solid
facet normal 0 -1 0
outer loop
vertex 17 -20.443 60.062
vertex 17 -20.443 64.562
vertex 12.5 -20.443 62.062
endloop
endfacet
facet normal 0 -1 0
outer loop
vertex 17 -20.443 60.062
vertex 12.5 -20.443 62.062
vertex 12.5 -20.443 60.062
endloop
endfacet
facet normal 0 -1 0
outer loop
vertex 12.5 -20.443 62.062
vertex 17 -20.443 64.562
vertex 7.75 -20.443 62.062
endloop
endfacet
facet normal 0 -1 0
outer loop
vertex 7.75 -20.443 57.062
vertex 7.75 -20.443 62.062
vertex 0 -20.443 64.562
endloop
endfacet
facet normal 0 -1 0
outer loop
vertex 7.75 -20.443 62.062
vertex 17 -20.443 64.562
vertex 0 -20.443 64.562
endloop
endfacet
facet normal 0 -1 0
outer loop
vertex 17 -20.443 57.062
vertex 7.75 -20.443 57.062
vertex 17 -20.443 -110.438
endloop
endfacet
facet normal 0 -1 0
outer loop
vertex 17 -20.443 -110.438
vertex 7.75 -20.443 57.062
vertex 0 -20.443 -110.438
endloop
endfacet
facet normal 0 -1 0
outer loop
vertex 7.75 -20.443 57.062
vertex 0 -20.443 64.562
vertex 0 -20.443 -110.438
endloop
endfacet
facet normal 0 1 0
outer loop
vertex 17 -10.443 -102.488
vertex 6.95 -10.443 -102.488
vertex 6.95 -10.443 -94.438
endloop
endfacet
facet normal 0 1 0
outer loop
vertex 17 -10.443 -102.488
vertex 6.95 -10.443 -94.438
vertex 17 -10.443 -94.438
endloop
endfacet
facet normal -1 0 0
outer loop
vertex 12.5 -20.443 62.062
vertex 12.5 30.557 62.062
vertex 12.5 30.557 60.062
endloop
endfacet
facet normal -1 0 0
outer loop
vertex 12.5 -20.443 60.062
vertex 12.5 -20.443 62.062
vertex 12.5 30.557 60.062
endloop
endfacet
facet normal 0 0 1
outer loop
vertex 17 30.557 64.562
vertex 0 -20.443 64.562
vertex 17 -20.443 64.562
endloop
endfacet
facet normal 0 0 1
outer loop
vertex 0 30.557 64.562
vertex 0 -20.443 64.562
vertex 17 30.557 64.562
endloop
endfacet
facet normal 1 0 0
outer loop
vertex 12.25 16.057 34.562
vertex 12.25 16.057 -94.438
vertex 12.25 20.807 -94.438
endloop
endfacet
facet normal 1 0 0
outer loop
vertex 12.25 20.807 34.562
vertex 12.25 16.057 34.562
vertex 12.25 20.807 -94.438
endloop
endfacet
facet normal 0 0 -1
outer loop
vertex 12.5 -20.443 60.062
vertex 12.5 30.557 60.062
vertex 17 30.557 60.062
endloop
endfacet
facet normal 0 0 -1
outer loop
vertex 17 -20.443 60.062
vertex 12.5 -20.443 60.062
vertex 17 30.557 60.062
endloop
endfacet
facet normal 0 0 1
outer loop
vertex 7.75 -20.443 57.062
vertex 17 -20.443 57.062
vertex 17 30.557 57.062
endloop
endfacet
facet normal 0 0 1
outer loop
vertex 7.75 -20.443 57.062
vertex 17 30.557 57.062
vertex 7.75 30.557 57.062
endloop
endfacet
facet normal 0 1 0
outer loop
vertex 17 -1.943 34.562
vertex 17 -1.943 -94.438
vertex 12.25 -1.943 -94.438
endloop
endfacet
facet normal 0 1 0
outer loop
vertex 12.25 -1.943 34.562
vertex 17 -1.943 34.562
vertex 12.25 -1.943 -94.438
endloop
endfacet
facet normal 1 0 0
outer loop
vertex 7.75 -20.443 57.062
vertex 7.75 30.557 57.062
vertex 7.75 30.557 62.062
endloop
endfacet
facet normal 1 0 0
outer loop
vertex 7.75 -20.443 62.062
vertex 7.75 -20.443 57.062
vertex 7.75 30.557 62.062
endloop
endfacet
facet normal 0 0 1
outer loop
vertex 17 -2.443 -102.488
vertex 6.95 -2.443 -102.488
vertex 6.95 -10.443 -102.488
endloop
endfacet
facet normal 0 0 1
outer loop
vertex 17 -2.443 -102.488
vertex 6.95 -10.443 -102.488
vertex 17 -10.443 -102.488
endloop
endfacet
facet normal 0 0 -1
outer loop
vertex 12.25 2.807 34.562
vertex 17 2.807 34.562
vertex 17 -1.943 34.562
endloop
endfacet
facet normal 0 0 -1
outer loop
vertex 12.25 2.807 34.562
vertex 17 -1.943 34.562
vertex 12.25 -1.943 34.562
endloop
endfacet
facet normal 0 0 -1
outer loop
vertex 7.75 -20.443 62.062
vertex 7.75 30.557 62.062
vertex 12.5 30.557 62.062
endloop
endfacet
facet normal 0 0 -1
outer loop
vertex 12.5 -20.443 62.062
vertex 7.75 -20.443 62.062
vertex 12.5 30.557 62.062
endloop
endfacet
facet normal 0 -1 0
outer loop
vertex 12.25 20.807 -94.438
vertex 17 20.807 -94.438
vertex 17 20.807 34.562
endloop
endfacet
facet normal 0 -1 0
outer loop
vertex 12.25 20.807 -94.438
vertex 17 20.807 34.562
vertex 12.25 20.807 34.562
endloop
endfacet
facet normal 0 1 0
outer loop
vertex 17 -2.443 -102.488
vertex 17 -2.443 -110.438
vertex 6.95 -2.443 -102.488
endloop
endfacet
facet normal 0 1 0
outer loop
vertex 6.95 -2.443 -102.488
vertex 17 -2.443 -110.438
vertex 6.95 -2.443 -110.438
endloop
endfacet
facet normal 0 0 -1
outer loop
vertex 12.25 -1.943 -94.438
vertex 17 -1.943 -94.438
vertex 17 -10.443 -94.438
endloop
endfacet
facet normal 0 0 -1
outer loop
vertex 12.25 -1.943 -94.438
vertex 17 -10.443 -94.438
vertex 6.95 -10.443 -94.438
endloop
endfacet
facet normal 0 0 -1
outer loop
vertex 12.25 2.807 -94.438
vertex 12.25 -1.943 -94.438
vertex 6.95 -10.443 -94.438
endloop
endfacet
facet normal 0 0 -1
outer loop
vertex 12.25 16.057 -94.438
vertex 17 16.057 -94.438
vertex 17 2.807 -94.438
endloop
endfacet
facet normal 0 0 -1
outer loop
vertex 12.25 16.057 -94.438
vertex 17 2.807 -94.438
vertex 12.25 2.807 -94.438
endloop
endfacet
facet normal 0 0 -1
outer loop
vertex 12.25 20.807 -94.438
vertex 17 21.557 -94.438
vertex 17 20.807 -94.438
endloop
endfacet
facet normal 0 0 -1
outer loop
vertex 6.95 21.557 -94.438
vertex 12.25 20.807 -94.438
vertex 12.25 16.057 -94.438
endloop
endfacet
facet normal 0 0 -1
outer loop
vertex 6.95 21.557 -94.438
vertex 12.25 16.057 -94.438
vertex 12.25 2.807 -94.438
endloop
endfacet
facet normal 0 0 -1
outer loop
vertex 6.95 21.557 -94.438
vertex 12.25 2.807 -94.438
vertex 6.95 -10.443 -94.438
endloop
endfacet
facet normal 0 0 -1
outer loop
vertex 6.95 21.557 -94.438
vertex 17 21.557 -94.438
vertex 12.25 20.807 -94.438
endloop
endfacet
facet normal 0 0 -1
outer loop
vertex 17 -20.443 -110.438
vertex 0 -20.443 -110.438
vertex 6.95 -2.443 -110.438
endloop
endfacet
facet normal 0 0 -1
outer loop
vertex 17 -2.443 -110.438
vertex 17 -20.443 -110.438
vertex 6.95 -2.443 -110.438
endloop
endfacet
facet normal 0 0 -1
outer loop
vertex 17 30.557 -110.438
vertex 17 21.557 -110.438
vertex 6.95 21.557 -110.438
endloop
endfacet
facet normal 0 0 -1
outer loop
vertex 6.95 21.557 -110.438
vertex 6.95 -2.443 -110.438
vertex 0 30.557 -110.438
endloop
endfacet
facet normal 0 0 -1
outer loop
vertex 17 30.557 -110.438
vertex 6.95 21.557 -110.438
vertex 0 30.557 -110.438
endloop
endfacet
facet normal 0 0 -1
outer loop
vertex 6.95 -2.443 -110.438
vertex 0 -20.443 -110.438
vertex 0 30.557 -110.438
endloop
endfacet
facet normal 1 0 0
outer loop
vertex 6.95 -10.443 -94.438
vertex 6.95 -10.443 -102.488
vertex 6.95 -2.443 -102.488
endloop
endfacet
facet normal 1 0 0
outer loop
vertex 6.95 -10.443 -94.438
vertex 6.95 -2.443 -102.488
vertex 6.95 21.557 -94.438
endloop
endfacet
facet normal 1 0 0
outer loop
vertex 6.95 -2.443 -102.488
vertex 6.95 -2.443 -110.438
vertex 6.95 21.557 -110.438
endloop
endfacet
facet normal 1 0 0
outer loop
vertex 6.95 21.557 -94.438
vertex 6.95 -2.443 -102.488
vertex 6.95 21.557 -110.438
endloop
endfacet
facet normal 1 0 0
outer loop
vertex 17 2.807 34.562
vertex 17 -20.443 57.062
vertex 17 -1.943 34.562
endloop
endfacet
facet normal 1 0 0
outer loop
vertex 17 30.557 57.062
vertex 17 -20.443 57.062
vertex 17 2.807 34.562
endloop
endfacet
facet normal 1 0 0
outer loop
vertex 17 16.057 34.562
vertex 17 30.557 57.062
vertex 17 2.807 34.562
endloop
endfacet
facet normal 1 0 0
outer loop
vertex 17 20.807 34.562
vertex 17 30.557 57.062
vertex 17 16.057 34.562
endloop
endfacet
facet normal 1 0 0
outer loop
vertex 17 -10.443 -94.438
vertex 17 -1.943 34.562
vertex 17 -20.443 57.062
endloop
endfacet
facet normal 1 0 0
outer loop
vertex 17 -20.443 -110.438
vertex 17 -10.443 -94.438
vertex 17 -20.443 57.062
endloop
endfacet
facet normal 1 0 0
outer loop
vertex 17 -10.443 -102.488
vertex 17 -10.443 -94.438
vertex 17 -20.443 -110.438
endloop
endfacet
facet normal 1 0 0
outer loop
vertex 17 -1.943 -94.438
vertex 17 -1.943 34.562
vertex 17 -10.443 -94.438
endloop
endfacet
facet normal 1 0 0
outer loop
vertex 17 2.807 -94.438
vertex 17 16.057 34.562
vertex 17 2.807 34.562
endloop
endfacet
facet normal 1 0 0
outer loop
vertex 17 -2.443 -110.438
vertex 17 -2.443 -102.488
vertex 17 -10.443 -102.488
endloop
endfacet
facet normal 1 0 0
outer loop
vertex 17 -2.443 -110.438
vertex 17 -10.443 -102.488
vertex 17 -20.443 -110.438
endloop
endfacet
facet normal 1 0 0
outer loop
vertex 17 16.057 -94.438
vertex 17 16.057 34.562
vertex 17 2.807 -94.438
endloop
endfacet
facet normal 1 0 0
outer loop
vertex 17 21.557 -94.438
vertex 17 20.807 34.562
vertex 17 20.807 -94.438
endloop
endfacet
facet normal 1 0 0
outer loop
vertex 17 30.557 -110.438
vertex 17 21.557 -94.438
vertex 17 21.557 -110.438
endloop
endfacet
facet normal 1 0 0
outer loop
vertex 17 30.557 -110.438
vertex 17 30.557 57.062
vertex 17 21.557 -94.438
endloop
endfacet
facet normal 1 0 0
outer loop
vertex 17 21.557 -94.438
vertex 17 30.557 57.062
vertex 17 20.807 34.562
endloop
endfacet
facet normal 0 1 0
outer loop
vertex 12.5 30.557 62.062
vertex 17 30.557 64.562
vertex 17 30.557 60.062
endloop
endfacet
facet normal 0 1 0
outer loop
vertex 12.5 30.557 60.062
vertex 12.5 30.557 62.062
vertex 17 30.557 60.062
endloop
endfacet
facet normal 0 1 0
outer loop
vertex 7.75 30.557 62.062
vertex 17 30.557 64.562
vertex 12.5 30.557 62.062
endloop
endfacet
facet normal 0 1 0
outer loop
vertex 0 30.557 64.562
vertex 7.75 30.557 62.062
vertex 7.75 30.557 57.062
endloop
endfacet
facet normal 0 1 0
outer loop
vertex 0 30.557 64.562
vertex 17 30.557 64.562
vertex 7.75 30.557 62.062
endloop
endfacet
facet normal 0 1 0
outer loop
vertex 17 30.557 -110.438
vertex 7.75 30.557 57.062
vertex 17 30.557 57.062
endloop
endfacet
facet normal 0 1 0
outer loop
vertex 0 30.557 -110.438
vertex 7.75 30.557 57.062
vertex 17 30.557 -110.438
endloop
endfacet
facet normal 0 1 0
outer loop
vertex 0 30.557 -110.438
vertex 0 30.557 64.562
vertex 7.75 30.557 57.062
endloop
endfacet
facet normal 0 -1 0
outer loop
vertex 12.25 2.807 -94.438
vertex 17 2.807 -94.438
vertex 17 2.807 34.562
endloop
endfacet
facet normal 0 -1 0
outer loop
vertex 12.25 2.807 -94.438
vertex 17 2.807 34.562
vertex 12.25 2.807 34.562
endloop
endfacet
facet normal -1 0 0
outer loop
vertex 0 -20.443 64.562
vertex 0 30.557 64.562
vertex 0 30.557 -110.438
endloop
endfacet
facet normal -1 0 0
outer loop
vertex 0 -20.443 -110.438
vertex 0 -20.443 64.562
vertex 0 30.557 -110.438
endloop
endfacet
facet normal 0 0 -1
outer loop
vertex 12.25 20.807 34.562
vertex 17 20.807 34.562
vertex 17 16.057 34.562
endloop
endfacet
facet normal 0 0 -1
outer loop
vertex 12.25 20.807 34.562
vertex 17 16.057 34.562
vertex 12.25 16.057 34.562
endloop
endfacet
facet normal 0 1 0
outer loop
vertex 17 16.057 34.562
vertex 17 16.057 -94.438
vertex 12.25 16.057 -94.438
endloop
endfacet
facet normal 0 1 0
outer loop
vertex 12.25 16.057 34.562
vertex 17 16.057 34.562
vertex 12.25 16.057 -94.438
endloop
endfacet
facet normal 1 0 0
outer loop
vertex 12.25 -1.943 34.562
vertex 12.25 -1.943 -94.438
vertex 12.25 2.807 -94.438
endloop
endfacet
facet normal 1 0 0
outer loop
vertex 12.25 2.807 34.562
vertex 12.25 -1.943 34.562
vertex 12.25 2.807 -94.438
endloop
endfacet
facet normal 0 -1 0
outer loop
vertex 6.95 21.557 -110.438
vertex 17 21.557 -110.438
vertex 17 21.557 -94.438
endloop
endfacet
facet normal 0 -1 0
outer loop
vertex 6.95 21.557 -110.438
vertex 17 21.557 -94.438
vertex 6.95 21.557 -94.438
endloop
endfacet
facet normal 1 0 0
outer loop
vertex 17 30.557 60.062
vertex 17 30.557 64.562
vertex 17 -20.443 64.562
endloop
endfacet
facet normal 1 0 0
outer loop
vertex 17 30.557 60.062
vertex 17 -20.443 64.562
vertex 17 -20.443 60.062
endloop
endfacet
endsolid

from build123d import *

# Parameters (mm, degrees)
SKETCH1_W           = 175
SKETCH1_H           = 51
BOSS_EXTRUDE1_DEPTH = 17
CUT_EXTRUDE3_DEPTH  = 52
SKETCH7_W           = 4.75
SKETCH7_H           = 4.75
CUT_EXTRUDE5_DEPTH  = 145
SKETCH10_W          = 10.05
SKETCH10_H          = 24
CUT_EXTRUDE6_DEPTH  = 16
SKETCH11_W          = 10.05
SKETCH11_H          = 8.05
CUT_EXTRUDE7_DEPTH  = 8


with BuildPart() as part:
    # Sketch1 → Boss-Extrude1 (new body)
    with BuildSketch(Plane(origin=(0, 0, 0), x_dir=(0, 0, -1), z_dir=(1, 0, 0))):
        with Locations((22.937921078, 5.057266603)):
            Rectangle(SKETCH1_W, SKETCH1_H)
    extrude(amount=BOSS_EXTRUDE1_DEPTH)

    # Sketch6 → Cut-Extrude3 (cut, through all)
    with BuildSketch(Plane(origin=(0, 30.557266603, 0), x_dir=(1, 0, 0), z_dir=(0, 1, 0))):
        Polygon((12.5, -60.062078922), (17, -60.062078922), (17, -57.062078922), (14.5, -57.062078922), (7.75, -57.062078922), (7.75, -62.062078922), (12.5, -62.062078922), align=None)
    extrude(amount=-CUT_EXTRUDE3_DEPTH, mode=Mode.SUBTRACT)

    # Sketch7 → Cut-Extrude5 (cut)
    with BuildSketch(Plane(origin=(0, 0, -110.437921078), x_dir=(-1, 0, 0), z_dir=(0, 0, -1))):
        with Locations((-14.625, 0.432266603)):
            Rectangle(SKETCH7_W, SKETCH7_H)
        with Locations((-14.625, 18.432266603)):
            Rectangle(SKETCH7_W, SKETCH7_H)
    extrude(amount=-CUT_EXTRUDE5_DEPTH, mode=Mode.SUBTRACT)

    # Sketch10 → Cut-Extrude6 (cut)
    with BuildSketch(Plane(origin=(0, 0, -110.437921078), x_dir=(-1, 0, 0), z_dir=(0, 0, -1))):
        with Locations((-11.975, 9.557266603)):
            Rectangle(SKETCH10_W, SKETCH10_H)
    extrude(amount=-CUT_EXTRUDE6_DEPTH, mode=Mode.SUBTRACT)

    # Sketch11 → Cut-Extrude7 (cut)
    with BuildSketch(Plane(origin=(0, -2.442733397, 0), x_dir=(1, 0, 0), z_dir=(0, 1, 0))):
        with Locations((11.975, 98.462921078)):
            Rectangle(SKETCH11_W, SKETCH11_H)
    extrude(amount=-CUT_EXTRUDE7_DEPTH, mode=Mode.SUBTRACT)


solid = part.part
